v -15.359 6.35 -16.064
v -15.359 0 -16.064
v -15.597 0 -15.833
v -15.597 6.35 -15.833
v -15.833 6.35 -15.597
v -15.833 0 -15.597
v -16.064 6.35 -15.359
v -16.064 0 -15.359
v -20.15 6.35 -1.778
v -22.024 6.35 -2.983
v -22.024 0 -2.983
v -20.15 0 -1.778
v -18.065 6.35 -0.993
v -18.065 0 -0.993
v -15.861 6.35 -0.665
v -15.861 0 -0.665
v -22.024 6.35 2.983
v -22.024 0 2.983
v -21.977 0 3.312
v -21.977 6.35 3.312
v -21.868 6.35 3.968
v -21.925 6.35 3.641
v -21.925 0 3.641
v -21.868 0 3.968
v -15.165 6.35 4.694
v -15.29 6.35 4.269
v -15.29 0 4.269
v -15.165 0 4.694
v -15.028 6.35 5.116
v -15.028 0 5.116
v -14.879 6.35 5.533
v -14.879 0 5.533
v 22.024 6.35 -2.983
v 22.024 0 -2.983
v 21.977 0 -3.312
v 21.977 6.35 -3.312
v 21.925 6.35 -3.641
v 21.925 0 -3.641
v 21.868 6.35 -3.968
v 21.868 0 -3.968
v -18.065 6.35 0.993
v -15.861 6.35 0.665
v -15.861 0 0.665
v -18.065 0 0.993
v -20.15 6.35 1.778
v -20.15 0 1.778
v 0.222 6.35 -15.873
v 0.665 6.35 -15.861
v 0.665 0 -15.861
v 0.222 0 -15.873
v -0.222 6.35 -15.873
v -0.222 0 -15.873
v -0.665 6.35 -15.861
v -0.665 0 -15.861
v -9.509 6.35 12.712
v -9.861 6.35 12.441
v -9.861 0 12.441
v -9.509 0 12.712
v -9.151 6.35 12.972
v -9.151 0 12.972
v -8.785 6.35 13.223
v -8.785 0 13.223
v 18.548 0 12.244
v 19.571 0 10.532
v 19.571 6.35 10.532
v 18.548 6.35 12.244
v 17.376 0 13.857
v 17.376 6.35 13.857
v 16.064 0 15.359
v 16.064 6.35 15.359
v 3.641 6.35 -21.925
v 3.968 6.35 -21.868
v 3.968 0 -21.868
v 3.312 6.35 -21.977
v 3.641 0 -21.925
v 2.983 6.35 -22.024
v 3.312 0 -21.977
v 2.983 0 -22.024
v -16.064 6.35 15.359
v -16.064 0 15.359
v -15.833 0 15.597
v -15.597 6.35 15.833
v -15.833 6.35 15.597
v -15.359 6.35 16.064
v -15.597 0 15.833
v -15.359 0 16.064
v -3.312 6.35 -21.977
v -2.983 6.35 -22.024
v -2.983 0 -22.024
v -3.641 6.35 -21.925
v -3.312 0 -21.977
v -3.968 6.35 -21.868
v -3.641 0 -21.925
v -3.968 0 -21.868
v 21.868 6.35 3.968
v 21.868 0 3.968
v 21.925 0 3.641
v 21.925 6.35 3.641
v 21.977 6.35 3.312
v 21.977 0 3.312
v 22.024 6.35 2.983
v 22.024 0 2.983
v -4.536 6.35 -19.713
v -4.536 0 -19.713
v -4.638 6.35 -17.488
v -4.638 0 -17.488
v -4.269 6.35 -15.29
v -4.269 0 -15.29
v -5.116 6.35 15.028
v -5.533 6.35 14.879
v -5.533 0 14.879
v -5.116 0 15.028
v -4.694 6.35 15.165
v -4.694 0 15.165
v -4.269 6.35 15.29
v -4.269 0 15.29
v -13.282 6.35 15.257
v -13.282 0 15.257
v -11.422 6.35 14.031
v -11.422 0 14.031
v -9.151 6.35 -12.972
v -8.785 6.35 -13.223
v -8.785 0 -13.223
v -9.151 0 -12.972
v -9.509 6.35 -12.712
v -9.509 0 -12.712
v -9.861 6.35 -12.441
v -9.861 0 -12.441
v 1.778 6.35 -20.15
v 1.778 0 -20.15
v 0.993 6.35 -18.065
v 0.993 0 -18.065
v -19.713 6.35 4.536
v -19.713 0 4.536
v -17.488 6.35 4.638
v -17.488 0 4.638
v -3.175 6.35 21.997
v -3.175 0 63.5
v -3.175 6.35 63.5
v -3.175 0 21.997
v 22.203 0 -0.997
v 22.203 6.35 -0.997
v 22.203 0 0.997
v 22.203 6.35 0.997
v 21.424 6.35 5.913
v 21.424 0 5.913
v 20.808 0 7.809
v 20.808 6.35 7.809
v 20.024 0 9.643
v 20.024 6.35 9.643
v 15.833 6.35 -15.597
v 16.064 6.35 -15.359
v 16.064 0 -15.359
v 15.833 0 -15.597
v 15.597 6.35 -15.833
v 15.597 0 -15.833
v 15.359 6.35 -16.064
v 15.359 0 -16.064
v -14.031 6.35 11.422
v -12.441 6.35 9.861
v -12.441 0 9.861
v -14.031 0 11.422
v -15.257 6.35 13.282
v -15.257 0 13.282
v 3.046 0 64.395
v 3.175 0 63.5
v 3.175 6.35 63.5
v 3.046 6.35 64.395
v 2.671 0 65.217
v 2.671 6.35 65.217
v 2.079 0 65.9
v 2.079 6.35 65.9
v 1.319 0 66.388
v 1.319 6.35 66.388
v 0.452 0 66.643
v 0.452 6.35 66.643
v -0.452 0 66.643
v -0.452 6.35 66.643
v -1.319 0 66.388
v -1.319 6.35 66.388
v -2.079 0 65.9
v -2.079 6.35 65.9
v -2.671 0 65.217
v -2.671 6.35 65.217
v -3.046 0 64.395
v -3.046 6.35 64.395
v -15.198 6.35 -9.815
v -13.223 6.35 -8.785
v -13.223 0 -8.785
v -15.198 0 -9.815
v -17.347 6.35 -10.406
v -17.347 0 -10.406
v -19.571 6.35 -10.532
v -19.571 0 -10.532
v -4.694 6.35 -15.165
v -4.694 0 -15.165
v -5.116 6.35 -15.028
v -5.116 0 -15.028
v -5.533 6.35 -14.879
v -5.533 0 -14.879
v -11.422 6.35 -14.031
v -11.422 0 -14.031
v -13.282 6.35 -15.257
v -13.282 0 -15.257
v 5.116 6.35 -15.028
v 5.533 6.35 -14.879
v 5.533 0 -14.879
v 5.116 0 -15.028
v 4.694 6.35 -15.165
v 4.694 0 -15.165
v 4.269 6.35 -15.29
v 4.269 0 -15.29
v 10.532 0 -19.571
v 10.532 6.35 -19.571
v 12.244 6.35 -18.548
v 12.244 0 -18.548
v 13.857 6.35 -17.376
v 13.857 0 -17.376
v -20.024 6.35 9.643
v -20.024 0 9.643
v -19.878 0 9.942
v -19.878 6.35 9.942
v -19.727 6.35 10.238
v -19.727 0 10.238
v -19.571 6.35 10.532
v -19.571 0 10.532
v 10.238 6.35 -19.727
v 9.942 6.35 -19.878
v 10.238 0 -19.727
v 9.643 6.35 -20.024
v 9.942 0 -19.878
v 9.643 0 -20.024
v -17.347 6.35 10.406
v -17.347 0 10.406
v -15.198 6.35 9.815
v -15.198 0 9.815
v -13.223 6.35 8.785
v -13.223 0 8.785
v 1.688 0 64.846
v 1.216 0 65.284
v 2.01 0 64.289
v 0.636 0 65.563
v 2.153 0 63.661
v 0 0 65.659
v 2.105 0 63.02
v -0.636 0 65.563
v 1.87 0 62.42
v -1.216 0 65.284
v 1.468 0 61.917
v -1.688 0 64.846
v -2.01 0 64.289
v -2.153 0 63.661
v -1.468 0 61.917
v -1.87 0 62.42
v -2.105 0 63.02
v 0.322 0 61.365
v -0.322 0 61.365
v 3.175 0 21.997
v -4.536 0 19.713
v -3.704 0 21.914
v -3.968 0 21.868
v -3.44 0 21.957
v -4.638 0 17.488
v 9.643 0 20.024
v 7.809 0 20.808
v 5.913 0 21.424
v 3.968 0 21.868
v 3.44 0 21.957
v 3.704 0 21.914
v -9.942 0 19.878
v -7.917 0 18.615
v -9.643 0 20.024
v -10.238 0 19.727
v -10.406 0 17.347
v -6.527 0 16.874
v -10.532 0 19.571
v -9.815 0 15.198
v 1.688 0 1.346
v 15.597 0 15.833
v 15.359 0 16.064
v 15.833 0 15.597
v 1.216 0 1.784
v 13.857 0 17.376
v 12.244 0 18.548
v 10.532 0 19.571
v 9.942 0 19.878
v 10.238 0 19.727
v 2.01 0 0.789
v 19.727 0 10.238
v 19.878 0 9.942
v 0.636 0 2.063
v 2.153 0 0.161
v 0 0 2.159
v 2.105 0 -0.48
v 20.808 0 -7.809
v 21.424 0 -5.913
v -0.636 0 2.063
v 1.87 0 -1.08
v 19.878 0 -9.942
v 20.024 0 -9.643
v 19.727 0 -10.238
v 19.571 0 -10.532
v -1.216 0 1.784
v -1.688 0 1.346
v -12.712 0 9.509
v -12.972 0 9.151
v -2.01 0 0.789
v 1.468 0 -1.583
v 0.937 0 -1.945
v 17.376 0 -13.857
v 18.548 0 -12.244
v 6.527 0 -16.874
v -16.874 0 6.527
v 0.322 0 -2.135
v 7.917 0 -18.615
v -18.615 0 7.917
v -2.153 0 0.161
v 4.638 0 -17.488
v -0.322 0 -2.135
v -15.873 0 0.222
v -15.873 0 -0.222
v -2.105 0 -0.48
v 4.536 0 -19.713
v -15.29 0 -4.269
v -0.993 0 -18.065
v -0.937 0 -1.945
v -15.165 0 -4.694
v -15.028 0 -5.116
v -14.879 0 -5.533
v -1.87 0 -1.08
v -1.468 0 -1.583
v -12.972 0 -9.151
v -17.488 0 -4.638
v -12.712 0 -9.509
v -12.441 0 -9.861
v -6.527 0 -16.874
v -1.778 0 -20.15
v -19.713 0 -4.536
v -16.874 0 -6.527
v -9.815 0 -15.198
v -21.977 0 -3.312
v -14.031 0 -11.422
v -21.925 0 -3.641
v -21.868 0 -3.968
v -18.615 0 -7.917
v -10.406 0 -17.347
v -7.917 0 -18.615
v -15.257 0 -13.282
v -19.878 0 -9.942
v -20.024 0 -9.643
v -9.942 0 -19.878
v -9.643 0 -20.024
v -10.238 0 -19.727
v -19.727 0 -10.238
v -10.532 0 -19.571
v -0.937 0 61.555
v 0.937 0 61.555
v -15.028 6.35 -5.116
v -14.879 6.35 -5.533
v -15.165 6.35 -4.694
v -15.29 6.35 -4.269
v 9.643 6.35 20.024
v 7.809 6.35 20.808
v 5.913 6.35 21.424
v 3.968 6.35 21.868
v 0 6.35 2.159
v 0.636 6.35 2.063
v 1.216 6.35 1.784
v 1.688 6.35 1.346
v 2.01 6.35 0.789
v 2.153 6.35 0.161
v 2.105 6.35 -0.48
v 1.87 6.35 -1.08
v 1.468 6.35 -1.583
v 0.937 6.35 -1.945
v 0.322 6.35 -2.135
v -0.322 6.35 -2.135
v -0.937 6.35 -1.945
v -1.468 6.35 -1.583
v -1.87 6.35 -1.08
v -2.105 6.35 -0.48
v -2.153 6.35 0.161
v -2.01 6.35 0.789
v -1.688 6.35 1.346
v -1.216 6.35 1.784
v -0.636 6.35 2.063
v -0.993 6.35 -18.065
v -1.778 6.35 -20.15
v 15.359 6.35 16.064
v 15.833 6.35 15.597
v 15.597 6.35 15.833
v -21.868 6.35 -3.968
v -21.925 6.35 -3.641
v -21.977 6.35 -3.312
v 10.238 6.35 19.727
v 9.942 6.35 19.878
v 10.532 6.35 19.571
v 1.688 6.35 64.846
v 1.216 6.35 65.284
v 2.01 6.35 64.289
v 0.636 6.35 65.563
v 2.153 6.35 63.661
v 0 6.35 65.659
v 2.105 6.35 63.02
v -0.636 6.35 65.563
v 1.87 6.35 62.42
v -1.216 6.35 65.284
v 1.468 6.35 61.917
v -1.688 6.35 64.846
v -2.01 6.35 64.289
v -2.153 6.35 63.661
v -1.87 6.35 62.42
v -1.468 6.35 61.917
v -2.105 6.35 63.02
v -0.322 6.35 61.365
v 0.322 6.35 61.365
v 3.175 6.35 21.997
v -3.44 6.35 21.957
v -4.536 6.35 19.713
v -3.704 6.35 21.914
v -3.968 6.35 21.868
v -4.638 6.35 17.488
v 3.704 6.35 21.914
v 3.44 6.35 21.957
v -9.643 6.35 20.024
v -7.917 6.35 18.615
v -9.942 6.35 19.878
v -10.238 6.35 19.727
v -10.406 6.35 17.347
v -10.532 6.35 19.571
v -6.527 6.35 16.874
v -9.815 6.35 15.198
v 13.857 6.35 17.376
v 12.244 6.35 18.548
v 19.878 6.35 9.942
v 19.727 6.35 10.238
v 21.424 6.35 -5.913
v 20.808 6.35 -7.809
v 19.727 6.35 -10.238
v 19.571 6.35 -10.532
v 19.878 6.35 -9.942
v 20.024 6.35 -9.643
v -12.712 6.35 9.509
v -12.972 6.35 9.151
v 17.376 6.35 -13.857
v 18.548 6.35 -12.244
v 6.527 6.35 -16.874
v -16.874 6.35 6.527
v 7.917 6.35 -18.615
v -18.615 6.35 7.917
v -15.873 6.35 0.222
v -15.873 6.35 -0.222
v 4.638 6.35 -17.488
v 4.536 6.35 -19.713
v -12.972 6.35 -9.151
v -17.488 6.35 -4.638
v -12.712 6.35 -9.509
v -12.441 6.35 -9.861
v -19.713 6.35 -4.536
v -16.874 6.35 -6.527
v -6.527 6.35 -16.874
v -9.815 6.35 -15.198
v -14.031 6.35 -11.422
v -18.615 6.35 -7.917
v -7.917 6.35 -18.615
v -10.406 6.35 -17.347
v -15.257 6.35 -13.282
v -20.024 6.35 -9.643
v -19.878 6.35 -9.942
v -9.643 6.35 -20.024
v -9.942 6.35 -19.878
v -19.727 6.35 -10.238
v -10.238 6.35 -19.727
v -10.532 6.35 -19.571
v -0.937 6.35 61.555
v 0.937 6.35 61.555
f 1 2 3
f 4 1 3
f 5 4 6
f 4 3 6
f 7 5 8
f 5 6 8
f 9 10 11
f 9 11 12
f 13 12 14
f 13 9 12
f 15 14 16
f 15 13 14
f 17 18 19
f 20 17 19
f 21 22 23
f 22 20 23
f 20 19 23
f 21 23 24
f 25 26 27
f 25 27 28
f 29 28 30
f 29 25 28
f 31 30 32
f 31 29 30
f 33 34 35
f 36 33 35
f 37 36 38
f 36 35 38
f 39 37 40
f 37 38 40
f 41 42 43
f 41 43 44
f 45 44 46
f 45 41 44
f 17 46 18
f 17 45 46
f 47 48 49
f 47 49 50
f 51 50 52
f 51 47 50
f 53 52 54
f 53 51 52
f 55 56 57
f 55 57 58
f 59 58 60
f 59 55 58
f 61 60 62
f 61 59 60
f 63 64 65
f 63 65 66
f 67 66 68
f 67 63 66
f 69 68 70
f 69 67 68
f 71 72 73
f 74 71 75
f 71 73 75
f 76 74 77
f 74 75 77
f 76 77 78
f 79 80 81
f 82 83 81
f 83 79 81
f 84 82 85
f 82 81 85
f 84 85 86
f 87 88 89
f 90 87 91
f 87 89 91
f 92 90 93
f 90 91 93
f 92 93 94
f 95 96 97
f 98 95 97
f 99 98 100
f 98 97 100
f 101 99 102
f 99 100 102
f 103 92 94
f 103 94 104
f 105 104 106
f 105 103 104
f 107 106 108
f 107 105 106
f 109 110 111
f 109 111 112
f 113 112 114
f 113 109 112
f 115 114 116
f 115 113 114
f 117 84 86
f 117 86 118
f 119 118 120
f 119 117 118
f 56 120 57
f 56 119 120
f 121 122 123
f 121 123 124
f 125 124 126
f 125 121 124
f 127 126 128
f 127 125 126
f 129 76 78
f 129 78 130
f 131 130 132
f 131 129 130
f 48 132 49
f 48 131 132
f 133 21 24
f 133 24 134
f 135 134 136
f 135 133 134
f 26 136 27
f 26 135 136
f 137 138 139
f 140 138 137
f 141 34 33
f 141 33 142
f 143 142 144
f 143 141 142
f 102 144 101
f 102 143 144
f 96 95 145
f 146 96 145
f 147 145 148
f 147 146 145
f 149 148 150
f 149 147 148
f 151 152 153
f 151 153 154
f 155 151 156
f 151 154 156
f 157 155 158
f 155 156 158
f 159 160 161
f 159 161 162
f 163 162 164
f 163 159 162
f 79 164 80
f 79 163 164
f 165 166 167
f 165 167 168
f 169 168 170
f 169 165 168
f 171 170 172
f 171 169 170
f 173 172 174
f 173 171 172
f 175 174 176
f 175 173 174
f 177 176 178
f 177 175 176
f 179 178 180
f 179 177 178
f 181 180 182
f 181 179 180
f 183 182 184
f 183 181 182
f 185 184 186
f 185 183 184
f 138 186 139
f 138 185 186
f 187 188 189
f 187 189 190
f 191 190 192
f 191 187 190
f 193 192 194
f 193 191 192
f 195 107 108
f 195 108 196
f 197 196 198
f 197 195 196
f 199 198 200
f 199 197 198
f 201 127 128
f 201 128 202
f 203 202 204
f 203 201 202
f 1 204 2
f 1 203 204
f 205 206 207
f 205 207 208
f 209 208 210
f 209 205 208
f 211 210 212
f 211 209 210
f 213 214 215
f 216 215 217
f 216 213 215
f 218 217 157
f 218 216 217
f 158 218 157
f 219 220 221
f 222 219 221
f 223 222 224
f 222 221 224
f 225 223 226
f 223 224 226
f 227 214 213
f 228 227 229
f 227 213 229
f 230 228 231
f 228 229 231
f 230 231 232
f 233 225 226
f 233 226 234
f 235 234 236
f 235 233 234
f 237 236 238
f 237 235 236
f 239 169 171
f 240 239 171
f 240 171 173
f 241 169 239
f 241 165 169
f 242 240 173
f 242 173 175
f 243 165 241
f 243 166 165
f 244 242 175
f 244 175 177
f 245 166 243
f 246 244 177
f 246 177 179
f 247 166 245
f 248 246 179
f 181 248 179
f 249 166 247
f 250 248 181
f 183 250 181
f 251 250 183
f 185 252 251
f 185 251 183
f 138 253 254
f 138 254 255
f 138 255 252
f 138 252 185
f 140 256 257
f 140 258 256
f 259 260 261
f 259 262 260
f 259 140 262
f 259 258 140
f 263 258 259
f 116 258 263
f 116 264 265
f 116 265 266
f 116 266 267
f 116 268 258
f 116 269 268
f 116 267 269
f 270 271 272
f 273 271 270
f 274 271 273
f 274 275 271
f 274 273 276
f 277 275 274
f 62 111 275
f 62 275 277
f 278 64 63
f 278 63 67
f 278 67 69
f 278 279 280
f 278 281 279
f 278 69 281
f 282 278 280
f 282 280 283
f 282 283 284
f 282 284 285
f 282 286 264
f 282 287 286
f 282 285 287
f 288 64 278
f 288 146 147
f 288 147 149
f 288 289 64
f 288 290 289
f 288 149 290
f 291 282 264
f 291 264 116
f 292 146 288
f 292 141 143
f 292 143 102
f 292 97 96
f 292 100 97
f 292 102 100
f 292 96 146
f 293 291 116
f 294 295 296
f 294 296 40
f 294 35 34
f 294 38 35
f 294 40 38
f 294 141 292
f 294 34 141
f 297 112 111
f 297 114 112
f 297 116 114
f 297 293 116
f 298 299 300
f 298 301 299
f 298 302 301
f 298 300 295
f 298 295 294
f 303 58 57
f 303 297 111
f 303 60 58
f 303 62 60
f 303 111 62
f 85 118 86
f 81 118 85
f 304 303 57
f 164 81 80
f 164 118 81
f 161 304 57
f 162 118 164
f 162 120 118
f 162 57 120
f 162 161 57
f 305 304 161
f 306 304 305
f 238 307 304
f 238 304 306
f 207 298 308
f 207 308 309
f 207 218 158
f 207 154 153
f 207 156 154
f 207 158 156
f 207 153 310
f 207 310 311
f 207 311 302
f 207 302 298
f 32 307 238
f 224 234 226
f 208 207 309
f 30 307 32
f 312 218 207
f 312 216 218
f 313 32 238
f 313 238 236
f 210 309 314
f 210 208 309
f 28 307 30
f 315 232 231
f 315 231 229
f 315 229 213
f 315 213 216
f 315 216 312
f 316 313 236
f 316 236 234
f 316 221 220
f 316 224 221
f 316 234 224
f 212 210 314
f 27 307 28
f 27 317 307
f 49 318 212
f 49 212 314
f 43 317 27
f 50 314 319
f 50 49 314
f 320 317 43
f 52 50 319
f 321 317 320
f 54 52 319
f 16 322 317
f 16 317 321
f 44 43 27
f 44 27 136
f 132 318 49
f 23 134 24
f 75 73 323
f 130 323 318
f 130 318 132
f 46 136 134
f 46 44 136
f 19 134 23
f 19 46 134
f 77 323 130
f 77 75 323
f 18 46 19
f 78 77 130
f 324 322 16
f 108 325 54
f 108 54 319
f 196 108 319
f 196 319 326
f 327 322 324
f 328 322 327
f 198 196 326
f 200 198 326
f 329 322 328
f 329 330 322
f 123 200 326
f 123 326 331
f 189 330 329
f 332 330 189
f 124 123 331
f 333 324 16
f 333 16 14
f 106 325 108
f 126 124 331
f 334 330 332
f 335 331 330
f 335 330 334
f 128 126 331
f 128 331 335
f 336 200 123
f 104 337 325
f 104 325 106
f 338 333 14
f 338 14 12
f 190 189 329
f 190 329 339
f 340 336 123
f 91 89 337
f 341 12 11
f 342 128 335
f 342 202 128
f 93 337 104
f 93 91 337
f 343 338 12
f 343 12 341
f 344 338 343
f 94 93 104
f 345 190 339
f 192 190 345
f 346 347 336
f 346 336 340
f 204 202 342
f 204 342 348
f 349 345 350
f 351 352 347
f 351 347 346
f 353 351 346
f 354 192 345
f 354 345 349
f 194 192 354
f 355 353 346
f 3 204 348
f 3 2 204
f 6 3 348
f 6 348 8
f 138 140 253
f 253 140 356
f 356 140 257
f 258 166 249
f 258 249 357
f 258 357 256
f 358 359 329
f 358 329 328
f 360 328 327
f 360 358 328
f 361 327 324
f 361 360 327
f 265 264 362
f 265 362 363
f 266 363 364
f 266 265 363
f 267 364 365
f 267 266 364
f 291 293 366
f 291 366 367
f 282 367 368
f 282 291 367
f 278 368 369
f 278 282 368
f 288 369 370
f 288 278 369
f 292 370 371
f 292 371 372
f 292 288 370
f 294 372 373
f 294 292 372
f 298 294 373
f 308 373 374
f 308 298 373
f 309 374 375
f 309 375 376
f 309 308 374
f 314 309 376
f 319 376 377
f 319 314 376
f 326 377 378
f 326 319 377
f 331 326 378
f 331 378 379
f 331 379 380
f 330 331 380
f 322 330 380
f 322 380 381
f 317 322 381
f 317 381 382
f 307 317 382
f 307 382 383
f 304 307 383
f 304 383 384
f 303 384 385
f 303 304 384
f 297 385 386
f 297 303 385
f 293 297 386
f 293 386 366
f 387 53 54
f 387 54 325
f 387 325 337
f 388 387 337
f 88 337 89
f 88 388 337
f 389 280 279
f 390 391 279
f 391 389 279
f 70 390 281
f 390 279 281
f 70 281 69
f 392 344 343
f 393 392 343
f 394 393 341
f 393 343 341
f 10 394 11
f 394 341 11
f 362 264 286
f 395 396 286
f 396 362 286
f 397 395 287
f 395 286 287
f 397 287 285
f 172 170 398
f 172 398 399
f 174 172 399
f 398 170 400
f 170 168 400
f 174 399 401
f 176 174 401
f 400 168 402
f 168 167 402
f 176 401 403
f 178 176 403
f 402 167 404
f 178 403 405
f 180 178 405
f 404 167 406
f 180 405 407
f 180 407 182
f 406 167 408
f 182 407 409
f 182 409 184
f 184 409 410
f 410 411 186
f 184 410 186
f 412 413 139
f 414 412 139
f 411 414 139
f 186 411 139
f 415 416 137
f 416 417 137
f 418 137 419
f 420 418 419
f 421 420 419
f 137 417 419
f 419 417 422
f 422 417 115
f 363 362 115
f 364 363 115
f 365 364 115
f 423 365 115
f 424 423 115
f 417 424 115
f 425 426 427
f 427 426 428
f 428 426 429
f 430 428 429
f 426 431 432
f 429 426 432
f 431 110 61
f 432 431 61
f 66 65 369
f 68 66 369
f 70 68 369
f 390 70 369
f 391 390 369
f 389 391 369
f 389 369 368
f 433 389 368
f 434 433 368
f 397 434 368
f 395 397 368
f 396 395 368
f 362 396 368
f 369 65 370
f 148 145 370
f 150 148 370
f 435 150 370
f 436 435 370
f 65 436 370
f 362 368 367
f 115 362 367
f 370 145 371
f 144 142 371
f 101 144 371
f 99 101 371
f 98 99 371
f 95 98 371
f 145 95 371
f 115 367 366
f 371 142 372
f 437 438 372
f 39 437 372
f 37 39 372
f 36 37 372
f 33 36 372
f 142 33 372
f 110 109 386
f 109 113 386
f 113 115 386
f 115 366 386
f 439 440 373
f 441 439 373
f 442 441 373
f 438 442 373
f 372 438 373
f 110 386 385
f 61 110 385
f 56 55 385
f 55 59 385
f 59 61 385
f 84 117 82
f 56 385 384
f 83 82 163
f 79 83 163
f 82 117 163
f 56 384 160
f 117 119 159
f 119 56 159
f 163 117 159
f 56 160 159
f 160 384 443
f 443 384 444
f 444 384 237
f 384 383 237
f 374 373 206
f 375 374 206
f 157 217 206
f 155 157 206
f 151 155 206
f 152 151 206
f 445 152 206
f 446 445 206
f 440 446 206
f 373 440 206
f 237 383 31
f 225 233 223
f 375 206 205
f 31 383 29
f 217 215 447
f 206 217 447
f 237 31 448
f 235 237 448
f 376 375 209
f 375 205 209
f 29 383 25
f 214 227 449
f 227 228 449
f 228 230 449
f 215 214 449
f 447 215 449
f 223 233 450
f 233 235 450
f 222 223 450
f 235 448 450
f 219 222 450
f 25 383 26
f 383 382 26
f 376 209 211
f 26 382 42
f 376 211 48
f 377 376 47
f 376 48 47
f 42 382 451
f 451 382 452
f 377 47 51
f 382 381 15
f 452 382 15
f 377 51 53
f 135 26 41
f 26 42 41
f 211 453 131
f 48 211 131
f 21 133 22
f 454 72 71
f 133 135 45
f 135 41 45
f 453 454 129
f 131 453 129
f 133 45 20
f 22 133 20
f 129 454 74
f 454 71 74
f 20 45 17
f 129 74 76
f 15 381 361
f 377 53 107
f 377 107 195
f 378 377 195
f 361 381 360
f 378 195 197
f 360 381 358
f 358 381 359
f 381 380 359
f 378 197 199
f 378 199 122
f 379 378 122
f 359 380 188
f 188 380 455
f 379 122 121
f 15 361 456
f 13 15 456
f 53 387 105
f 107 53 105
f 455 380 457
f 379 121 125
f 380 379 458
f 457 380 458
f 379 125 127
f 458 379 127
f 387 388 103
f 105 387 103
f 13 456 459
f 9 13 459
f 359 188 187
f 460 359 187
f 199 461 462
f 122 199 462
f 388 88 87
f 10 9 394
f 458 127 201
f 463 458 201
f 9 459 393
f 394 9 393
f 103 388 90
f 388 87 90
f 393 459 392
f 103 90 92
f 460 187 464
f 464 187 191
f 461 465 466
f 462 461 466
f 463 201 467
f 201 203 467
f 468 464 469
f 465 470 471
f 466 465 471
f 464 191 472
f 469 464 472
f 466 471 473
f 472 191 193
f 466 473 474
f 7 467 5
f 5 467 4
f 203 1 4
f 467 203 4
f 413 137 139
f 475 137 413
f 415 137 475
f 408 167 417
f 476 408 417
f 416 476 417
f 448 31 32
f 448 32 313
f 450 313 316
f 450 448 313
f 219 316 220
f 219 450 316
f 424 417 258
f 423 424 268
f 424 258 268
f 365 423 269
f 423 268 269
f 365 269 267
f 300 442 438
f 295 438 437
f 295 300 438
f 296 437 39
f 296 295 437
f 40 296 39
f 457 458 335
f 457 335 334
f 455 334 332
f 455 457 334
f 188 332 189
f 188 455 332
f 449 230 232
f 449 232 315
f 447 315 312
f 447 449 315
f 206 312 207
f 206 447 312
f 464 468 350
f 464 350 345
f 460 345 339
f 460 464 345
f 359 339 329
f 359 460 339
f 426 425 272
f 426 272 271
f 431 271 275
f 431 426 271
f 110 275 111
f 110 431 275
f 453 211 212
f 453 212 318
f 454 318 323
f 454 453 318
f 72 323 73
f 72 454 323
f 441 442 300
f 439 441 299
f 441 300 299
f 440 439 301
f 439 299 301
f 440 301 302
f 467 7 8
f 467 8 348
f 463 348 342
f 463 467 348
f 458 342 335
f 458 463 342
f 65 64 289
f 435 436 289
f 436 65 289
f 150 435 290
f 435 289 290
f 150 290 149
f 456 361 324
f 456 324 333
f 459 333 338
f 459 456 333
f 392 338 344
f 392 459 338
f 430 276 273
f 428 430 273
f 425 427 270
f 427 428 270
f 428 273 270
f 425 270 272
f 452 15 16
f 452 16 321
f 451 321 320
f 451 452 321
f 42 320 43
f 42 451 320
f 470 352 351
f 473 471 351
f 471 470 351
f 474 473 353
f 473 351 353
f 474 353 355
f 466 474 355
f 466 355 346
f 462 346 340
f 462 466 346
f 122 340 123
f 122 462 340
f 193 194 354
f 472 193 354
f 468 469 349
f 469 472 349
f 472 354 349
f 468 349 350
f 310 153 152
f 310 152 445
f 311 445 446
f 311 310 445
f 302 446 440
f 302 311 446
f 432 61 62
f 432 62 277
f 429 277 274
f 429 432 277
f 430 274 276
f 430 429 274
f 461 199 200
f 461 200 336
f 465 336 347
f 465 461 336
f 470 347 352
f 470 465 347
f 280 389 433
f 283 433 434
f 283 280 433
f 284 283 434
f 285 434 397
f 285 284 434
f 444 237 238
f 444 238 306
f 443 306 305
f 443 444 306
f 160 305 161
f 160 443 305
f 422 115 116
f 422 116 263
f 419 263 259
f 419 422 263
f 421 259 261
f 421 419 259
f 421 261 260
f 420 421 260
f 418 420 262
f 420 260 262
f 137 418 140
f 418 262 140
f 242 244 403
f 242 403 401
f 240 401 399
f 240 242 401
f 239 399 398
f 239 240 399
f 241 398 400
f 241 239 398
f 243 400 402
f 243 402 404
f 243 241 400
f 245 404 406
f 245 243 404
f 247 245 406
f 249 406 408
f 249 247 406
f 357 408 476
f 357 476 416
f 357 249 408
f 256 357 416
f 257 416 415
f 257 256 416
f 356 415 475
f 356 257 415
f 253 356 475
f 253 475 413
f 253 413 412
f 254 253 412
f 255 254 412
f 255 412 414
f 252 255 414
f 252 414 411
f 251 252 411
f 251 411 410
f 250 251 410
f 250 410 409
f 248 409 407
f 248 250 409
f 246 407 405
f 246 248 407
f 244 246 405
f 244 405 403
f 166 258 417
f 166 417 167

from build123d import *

# Parameters (mm, degrees)
SKETCH1_R           = 22.225
SKETCH1_R_2         = 2.159
BOSS_EXTRUDE1_DEPTH = 6.35
CUT_EXTRUDE1_DEPTH  = 33.065928179
CIRPATTERN1_COUNT   = 20
BOSS_EXTRUDE2_START = -6.35
SKETCH3_R           = 2.159
BOSS_EXTRUDE2_DEPTH = 6.35


with BuildPart() as part:
    # Sketch1 → Boss-Extrude1 (new body)
    with BuildSketch(Plane(origin=(0, 0, 0), x_dir=(1, 0, 0), z_dir=(0, 1, 0))):
        with Locations(Location((0, 0, 0), (0, 0, 270))):
            Circle(SKETCH1_R)
        with Locations(Location((0, 0, 0), (0, 0, 270))):
            Circle(SKETCH1_R_2, mode=Mode.SUBTRACT)
    extrude(amount=BOSS_EXTRUDE1_DEPTH)

    # Sketch2 → Cut-Extrude1 (cut, through all)
    with BuildSketch(Plane(origin=(0, 6.35, 0), x_dir=(1, 0, 0), z_dir=(0, 1, 0))):
        with BuildLine():
            ThreePointArc((0.664641226, 15.861080576), (0, 15.875), (-0.664641226, 15.861080576))
            ThreePointArc((-0.664641226, 15.861080576), (-1.329908729, 19.128362584), (-2.983334333, 22.023858455))
            ThreePointArc((-2.983334333, 22.023858455), (0, 22.225), (2.983334333, 22.023858455))
            ThreePointArc((2.983334333, 22.023858455), (1.329908729, 19.128362584), (0.664641226, 15.861080576))
        make_face()
    cut_extrude1 = extrude(amount=-CUT_EXTRUDE1_DEPTH, mode=Mode.SUBTRACT)

    # CirPattern1: Cut-Extrude1 ×20 about axis
    cirpattern1_axis = Axis((0, 0, 0), (0, 1, 0))
    for i in range(1, CIRPATTERN1_COUNT):
        add(cut_extrude1.rotate(cirpattern1_axis, i * 360 / CIRPATTERN1_COUNT), mode=Mode.SUBTRACT)

    # Sketch3 → Boss-Extrude2 (add)
    with BuildSketch(Plane(origin=(0, 6.35, 0), x_dir=(1, 0, 0), z_dir=(0, 1, 0)).offset(BOSS_EXTRUDE2_START)):
        with BuildLine():
            Line((3.175, -21.997045256), (3.175, -63.5))
            ThreePointArc((3.175, -63.5), (0, -66.675), (-3.175, -63.5))
            Line((-3.175, -63.5), (-3.175, 4.58754015))
            Line((-3.175, 4.58754015), (10.089938857, 19.80262))
            ThreePointArc((10.089938857, 19.80262), (21.926984622, -3.62739168), (3.175, -21.997045256))
        make_face()
        with Locations(Location((0, -63.5, 0), (0, 0, 270))):
            Circle(SKETCH3_R, mode=Mode.SUBTRACT)
        with Locations(Location((0, 0, 0), (0, 0, 270))):
            Circle(SKETCH3_R, mode=Mode.SUBTRACT)
    extrude(amount=BOSS_EXTRUDE2_DEPTH)


solid = part.part
